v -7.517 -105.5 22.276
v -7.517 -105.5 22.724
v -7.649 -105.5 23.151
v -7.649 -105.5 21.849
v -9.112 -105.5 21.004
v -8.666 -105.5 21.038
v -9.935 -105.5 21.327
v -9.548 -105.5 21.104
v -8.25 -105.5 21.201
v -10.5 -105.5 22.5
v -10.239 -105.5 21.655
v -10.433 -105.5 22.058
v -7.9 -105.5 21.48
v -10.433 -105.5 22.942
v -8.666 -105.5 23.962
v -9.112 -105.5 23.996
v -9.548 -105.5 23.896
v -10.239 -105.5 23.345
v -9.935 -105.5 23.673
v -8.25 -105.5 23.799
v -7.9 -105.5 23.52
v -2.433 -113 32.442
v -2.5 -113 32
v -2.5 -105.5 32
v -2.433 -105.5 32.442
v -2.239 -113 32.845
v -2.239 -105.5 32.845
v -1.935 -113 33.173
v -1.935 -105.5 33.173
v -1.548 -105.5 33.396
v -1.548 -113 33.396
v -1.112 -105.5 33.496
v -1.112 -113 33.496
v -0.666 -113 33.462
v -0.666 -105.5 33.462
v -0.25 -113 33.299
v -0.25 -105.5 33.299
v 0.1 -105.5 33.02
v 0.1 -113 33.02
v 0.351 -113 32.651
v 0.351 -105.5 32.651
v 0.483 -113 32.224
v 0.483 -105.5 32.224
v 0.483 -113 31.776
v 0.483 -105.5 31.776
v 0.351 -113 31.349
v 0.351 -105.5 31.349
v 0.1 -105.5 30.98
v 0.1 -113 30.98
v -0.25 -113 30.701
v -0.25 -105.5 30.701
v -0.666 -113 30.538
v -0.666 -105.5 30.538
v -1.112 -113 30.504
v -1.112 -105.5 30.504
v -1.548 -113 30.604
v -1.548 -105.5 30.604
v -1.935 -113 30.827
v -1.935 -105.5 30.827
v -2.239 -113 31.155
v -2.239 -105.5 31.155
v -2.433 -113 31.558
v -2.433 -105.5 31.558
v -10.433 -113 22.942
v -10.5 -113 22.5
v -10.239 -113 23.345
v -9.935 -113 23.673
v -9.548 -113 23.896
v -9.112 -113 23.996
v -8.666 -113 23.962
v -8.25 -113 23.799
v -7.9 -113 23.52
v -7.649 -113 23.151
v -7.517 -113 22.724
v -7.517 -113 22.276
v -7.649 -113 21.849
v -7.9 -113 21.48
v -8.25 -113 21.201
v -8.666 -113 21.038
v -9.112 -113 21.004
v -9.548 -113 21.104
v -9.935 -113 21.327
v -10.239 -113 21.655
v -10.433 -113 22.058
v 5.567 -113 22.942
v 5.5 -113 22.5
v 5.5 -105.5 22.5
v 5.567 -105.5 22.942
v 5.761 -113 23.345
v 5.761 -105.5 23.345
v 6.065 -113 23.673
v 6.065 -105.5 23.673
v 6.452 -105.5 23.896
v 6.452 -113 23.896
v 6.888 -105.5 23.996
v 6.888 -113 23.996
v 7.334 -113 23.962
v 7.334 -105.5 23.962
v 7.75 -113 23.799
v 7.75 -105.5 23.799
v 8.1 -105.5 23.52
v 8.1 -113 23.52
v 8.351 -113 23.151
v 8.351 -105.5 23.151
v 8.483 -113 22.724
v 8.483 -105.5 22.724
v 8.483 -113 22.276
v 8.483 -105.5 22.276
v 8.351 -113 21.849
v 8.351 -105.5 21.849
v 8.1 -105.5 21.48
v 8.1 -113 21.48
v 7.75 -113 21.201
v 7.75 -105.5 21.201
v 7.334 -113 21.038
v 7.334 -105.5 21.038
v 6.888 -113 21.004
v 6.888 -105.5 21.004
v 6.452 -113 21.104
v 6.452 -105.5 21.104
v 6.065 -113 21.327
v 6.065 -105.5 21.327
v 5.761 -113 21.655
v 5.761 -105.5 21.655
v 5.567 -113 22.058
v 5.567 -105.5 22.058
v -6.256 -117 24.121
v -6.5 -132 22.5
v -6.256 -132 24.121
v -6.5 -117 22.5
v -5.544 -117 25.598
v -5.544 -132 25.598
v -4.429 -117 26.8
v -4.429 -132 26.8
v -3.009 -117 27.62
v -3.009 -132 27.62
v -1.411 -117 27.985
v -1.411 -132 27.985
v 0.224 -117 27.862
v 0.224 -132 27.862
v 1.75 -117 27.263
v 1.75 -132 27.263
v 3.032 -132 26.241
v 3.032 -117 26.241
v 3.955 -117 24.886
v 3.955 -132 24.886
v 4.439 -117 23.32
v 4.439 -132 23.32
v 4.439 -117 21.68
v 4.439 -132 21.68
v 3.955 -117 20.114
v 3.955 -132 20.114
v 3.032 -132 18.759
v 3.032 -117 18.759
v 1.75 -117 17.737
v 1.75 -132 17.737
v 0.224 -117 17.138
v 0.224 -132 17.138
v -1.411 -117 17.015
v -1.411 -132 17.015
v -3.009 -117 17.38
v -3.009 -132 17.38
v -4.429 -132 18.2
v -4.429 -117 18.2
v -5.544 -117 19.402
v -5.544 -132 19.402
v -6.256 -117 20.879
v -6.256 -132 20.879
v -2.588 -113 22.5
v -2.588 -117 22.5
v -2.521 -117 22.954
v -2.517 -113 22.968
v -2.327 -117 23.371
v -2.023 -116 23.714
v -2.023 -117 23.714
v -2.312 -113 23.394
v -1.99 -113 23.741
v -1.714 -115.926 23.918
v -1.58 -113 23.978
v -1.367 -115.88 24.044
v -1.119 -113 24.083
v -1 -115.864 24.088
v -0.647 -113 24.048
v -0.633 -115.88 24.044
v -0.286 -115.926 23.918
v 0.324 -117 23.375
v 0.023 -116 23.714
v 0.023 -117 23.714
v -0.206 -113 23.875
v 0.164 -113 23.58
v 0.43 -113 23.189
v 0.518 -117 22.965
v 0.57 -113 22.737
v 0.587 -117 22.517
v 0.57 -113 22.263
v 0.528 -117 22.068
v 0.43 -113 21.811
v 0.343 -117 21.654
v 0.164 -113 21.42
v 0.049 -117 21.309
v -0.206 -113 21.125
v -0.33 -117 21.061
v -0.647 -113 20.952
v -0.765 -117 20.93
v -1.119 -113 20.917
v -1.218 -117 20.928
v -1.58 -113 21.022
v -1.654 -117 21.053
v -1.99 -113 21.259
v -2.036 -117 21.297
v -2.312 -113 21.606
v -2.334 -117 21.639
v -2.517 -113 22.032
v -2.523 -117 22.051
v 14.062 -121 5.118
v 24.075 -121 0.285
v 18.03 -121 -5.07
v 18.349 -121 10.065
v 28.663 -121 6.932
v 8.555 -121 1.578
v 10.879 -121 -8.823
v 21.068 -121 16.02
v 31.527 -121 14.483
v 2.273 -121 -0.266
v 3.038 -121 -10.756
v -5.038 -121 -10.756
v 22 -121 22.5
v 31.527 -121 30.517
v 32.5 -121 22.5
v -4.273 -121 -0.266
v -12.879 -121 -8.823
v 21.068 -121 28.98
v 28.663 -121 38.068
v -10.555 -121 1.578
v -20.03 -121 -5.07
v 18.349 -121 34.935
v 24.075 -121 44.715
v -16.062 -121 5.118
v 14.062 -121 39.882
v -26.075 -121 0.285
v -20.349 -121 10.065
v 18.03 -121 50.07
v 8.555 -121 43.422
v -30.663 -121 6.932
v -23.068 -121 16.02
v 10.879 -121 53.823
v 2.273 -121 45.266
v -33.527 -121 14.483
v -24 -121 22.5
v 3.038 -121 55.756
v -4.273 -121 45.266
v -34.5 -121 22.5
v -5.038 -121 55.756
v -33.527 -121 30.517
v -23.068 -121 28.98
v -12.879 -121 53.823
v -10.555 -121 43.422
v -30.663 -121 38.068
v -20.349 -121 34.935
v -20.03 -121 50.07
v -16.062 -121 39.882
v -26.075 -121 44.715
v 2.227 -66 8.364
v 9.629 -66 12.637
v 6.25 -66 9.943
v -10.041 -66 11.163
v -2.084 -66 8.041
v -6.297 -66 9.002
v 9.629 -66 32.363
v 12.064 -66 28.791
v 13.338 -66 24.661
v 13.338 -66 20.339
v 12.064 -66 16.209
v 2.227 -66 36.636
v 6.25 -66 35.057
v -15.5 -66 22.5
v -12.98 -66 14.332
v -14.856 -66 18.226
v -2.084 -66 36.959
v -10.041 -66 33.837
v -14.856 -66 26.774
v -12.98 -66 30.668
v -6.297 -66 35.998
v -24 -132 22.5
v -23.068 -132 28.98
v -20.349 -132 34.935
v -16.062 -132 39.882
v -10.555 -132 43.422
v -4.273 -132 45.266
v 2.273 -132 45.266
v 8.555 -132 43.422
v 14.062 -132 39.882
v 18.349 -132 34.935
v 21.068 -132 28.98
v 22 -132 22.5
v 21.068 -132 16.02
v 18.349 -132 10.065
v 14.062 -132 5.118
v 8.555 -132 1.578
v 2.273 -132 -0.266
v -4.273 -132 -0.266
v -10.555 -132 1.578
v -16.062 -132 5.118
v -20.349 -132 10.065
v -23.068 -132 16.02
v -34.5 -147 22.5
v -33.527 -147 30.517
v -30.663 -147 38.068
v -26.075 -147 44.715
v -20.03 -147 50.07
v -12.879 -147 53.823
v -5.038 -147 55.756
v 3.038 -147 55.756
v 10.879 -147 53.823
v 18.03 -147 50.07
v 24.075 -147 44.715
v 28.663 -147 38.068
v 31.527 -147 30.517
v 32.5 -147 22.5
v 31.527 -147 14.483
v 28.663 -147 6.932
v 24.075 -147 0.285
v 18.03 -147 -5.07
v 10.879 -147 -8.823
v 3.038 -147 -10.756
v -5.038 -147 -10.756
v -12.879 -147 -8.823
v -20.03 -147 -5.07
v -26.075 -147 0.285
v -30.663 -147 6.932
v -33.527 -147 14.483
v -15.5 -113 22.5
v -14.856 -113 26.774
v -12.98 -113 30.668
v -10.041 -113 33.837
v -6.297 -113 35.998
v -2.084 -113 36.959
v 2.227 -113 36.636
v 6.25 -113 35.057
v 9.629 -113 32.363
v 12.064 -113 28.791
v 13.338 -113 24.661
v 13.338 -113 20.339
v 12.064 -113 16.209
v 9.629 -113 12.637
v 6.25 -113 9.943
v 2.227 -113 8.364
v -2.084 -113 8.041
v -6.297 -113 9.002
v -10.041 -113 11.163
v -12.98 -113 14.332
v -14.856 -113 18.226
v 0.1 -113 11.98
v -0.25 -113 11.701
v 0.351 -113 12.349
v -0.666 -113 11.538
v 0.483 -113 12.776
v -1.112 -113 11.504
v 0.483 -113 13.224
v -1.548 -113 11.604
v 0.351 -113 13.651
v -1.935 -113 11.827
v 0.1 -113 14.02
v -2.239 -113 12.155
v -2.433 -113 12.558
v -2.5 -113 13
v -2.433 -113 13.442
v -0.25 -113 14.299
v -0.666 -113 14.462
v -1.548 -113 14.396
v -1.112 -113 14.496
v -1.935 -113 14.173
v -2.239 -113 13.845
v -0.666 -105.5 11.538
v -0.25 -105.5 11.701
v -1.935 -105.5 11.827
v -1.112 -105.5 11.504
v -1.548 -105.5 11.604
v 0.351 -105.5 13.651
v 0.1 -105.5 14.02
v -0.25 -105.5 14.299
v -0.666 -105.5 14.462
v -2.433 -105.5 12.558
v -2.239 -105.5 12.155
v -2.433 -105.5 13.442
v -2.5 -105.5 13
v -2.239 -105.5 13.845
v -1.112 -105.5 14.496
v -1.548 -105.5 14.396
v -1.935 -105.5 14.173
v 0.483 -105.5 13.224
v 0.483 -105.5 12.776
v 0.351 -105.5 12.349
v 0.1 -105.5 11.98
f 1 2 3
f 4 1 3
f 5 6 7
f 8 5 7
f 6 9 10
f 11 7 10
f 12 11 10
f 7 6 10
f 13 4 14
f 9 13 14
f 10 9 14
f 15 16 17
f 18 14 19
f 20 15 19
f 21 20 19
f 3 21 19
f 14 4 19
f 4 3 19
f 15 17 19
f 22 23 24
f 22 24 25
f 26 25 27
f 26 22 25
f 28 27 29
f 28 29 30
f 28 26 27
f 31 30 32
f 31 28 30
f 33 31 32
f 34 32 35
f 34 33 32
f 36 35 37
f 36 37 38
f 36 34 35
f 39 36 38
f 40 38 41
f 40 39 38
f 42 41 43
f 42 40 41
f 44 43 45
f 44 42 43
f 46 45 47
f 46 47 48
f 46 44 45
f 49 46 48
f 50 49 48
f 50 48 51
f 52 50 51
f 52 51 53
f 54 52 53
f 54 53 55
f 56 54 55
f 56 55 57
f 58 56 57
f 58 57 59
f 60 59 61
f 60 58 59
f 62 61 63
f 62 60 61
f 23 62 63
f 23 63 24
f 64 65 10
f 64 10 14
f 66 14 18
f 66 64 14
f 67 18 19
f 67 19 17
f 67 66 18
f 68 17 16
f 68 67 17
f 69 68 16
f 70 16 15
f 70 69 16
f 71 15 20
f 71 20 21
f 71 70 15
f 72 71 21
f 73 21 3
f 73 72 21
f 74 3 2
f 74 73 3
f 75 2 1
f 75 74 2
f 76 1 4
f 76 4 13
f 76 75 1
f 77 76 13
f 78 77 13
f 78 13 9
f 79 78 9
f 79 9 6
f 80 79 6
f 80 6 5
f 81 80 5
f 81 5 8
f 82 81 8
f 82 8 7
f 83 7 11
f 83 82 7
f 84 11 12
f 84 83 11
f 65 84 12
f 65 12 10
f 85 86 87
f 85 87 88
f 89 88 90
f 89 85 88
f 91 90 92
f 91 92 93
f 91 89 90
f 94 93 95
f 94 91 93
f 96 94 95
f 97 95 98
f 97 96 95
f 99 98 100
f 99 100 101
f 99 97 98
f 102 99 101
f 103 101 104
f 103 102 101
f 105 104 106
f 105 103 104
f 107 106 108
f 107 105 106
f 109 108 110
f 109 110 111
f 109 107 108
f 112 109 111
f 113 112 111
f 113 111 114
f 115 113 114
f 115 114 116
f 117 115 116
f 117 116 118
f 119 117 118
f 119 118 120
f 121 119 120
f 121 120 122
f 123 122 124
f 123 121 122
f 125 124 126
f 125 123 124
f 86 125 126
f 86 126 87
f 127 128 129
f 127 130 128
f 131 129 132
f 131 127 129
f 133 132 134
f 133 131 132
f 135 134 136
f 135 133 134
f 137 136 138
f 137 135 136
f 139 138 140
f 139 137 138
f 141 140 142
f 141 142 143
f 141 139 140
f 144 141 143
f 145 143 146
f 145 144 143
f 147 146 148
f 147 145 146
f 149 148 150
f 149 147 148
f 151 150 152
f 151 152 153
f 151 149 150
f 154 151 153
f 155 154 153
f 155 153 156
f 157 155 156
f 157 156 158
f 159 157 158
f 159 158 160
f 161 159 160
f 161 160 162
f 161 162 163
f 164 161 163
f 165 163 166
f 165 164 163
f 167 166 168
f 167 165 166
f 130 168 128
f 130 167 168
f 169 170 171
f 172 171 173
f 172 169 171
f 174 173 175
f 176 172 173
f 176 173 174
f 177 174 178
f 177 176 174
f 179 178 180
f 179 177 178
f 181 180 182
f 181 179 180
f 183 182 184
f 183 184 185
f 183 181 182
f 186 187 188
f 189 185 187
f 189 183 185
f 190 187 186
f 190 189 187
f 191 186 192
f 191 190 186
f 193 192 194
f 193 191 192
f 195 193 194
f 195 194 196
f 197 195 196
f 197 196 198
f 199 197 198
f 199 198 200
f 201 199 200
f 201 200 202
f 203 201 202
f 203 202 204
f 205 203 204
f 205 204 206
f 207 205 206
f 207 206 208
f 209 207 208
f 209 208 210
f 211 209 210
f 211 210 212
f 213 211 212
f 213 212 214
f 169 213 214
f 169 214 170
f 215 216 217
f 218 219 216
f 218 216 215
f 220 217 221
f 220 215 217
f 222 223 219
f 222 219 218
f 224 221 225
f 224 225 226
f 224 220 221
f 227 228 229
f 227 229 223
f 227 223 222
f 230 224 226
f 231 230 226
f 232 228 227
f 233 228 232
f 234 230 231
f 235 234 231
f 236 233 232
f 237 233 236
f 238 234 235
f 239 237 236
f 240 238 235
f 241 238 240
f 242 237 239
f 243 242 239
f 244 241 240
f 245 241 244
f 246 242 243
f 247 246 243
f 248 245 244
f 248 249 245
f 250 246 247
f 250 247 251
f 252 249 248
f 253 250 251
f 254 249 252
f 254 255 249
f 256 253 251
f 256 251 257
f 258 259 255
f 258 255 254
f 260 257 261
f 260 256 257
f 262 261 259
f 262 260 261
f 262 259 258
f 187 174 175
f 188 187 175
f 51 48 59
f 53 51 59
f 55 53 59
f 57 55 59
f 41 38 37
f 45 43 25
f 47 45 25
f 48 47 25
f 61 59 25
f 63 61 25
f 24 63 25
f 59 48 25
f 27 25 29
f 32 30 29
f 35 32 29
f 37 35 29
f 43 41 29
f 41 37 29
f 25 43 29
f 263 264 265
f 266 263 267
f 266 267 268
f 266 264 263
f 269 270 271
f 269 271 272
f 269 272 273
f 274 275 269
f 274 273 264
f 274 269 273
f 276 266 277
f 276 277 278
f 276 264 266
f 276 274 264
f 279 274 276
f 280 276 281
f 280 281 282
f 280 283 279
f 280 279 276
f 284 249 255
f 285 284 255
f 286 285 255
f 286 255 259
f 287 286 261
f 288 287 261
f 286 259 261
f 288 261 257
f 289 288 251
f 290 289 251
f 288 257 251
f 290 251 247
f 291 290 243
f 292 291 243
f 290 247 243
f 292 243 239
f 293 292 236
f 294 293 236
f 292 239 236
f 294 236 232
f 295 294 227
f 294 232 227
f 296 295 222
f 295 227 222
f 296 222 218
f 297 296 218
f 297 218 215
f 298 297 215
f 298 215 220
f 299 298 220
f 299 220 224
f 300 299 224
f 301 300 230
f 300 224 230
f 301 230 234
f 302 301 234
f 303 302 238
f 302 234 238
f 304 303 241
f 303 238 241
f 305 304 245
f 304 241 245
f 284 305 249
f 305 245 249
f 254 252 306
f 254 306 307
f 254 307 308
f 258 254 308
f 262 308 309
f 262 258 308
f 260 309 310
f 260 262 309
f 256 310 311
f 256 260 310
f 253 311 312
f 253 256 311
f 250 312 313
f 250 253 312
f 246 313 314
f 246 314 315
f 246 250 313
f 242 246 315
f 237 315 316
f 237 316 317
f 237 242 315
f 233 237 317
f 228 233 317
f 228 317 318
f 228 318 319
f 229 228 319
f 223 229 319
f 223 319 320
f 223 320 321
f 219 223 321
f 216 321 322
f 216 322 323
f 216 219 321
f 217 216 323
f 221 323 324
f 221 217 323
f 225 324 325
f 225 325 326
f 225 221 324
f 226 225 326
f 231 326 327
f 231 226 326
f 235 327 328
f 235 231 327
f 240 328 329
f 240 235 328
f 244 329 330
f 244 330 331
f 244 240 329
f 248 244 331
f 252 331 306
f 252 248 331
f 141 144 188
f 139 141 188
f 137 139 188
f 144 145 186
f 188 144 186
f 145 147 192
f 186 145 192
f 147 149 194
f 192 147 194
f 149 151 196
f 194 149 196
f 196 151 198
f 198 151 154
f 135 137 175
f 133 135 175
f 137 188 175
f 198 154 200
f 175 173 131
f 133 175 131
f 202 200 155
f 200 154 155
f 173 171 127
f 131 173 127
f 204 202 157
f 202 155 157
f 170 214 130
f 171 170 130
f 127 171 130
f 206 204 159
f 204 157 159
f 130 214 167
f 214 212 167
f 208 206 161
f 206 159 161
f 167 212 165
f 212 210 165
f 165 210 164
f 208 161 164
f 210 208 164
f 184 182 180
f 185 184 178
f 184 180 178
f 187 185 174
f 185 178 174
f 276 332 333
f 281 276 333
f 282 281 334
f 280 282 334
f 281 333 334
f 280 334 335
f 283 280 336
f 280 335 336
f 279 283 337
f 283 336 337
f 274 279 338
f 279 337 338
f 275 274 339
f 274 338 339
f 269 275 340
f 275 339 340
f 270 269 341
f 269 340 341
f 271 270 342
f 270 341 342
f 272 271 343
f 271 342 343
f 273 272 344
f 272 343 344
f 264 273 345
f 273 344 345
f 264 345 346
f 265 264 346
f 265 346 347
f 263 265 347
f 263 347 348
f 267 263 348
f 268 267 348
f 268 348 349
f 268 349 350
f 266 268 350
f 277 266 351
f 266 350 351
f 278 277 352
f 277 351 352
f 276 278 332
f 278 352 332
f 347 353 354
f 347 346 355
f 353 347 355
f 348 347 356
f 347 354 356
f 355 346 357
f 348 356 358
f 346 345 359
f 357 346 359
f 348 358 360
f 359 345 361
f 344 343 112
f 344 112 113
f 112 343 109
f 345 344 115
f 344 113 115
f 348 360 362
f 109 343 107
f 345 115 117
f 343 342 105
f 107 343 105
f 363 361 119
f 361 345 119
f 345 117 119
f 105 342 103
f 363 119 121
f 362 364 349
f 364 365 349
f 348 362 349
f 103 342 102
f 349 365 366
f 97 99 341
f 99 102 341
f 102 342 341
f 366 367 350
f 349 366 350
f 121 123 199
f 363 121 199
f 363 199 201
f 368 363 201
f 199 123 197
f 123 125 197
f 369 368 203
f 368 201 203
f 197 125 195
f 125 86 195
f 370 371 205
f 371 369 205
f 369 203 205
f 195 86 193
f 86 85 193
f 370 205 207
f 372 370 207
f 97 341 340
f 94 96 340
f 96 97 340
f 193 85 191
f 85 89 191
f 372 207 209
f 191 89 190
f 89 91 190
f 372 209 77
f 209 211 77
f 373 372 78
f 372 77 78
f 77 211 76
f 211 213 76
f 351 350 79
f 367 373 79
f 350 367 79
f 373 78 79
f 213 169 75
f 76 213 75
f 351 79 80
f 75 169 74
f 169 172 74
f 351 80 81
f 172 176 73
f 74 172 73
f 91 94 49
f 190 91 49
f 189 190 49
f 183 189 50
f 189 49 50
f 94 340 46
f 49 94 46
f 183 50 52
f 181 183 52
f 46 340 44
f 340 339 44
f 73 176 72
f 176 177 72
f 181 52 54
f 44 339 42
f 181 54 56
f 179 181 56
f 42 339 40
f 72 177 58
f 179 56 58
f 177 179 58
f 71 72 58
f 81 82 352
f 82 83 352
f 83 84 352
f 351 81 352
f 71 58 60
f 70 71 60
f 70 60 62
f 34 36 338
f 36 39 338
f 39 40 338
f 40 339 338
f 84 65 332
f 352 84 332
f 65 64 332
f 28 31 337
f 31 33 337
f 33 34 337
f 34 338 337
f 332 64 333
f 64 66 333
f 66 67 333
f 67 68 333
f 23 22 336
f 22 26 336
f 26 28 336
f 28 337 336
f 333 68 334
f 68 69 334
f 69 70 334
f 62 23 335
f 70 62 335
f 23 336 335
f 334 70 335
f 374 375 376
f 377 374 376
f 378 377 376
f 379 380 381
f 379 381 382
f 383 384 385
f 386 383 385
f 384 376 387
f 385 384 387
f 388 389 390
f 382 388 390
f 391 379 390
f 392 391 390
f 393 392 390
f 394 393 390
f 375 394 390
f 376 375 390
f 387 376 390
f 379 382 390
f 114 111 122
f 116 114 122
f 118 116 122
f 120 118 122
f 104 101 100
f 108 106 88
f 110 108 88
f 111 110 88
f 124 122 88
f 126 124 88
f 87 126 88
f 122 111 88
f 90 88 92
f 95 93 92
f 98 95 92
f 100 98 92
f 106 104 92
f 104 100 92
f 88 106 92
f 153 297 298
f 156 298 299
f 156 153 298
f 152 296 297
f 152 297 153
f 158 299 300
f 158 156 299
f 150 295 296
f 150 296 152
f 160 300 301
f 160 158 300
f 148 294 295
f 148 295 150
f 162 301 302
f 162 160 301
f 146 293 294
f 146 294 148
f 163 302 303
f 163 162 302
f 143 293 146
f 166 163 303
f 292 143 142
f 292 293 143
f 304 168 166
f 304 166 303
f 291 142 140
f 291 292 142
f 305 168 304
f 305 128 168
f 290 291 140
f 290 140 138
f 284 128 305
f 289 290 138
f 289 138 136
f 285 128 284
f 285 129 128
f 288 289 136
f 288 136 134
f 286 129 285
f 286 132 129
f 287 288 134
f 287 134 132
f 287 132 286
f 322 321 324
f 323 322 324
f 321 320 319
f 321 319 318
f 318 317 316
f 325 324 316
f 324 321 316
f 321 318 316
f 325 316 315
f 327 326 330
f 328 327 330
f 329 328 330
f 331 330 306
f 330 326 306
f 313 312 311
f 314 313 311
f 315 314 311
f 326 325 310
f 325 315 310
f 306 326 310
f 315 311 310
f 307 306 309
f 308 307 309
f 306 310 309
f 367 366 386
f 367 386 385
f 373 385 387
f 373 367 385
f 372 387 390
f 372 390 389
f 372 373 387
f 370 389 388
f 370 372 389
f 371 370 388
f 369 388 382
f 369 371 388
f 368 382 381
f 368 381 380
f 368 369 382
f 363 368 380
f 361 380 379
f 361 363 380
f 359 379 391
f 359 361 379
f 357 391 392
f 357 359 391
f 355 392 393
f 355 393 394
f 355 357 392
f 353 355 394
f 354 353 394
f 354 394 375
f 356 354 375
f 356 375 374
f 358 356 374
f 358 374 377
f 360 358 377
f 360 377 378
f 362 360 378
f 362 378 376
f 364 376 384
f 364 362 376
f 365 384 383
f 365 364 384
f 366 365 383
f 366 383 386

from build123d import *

# Parameters (mm, degrees)
SKETCH030_R             = 14.5
PAD018_DEPTH            = 47
SKETCH031_R             = 1.5875
PAD019_DEPTH            = 15
POCKET012_DEPTH         = 5
SKETCH033_R             = 5.5
PAD020_DEPTH            = 11
SKETCH034_R             = 33.5
PAD021_DEPTH            = 26
SKETCH035_R             = 1.5
POCKET013_DEPTH         = 7.5
SKETCH036_R             = 23
SKETCH036_R_2           = 5.5
POCKET014_DEPTH         = 11
BODY010_PLACEMENT_ANGLE = 180


with BuildPart() as part:
    # Sketch030 → Pad018 (new body)
    with BuildSketch(Plane.XZ):
        Circle(SKETCH030_R)
    extrude(amount=PAD018_DEPTH)

    # Sketch031 → Pad019 (join)
    with BuildSketch(Plane.XZ):
        Circle(SKETCH031_R)
    extrude(amount=-PAD019_DEPTH)

    # Sketch032 → Pocket012 (cut, symmetric)
    with BuildSketch(Plane.YZ):
        Polygon((3, 1.214123), (15, 1.214123), (15, 1.59), (2.863192, 1.59), align=None)
    extrude(amount=POCKET012_DEPTH, both=True, mode=Mode.SUBTRACT)

    # Sketch033 (on Face5 of Pocket012) → Pad020 (join)
    with BuildSketch(Plane(origin=(0, 15, 0), x_dir=(1, 0, 0), z_dir=(0, 1, 0))):
        Circle(SKETCH033_R)
    extrude(amount=-PAD020_DEPTH)

    # Sketch034 (on DatumPlane) → Pad021 (join)
    with BuildSketch(Plane.XZ.offset(-8)):
        Circle(SKETCH034_R)
    extrude(amount=-PAD021_DEPTH)

    # Sketch035 → Pocket013 (cut)
    with BuildSketch(Plane.XZ):
        with Locations((0, -9.5)):
            Circle(SKETCH035_R)
        with Locations((8, 0)):
            Circle(SKETCH035_R)
        with Locations((0, 9.5)):
            Circle(SKETCH035_R)
        with Locations((-8, 0)):
            Circle(SKETCH035_R)
    extrude(amount=POCKET013_DEPTH, mode=Mode.SUBTRACT)

    # Sketch036 (on DatumPlane) → Pocket014 (cut)
    with BuildSketch(Plane.XZ.offset(-8)):
        Circle(SKETCH036_R)
        Circle(SKETCH036_R_2, mode=Mode.SUBTRACT)
    extrude(amount=-POCKET014_DEPTH, mode=Mode.SUBTRACT)


with BuildPart() as part_1:
    # Body010 placement: moved
    add(part.part.moved(Location((-1, -113, 22.5))).rotate(Axis((-1, -113, 22.5), (0, 0, 1)), BODY010_PLACEMENT_ANGLE))


solid = part_1.part
